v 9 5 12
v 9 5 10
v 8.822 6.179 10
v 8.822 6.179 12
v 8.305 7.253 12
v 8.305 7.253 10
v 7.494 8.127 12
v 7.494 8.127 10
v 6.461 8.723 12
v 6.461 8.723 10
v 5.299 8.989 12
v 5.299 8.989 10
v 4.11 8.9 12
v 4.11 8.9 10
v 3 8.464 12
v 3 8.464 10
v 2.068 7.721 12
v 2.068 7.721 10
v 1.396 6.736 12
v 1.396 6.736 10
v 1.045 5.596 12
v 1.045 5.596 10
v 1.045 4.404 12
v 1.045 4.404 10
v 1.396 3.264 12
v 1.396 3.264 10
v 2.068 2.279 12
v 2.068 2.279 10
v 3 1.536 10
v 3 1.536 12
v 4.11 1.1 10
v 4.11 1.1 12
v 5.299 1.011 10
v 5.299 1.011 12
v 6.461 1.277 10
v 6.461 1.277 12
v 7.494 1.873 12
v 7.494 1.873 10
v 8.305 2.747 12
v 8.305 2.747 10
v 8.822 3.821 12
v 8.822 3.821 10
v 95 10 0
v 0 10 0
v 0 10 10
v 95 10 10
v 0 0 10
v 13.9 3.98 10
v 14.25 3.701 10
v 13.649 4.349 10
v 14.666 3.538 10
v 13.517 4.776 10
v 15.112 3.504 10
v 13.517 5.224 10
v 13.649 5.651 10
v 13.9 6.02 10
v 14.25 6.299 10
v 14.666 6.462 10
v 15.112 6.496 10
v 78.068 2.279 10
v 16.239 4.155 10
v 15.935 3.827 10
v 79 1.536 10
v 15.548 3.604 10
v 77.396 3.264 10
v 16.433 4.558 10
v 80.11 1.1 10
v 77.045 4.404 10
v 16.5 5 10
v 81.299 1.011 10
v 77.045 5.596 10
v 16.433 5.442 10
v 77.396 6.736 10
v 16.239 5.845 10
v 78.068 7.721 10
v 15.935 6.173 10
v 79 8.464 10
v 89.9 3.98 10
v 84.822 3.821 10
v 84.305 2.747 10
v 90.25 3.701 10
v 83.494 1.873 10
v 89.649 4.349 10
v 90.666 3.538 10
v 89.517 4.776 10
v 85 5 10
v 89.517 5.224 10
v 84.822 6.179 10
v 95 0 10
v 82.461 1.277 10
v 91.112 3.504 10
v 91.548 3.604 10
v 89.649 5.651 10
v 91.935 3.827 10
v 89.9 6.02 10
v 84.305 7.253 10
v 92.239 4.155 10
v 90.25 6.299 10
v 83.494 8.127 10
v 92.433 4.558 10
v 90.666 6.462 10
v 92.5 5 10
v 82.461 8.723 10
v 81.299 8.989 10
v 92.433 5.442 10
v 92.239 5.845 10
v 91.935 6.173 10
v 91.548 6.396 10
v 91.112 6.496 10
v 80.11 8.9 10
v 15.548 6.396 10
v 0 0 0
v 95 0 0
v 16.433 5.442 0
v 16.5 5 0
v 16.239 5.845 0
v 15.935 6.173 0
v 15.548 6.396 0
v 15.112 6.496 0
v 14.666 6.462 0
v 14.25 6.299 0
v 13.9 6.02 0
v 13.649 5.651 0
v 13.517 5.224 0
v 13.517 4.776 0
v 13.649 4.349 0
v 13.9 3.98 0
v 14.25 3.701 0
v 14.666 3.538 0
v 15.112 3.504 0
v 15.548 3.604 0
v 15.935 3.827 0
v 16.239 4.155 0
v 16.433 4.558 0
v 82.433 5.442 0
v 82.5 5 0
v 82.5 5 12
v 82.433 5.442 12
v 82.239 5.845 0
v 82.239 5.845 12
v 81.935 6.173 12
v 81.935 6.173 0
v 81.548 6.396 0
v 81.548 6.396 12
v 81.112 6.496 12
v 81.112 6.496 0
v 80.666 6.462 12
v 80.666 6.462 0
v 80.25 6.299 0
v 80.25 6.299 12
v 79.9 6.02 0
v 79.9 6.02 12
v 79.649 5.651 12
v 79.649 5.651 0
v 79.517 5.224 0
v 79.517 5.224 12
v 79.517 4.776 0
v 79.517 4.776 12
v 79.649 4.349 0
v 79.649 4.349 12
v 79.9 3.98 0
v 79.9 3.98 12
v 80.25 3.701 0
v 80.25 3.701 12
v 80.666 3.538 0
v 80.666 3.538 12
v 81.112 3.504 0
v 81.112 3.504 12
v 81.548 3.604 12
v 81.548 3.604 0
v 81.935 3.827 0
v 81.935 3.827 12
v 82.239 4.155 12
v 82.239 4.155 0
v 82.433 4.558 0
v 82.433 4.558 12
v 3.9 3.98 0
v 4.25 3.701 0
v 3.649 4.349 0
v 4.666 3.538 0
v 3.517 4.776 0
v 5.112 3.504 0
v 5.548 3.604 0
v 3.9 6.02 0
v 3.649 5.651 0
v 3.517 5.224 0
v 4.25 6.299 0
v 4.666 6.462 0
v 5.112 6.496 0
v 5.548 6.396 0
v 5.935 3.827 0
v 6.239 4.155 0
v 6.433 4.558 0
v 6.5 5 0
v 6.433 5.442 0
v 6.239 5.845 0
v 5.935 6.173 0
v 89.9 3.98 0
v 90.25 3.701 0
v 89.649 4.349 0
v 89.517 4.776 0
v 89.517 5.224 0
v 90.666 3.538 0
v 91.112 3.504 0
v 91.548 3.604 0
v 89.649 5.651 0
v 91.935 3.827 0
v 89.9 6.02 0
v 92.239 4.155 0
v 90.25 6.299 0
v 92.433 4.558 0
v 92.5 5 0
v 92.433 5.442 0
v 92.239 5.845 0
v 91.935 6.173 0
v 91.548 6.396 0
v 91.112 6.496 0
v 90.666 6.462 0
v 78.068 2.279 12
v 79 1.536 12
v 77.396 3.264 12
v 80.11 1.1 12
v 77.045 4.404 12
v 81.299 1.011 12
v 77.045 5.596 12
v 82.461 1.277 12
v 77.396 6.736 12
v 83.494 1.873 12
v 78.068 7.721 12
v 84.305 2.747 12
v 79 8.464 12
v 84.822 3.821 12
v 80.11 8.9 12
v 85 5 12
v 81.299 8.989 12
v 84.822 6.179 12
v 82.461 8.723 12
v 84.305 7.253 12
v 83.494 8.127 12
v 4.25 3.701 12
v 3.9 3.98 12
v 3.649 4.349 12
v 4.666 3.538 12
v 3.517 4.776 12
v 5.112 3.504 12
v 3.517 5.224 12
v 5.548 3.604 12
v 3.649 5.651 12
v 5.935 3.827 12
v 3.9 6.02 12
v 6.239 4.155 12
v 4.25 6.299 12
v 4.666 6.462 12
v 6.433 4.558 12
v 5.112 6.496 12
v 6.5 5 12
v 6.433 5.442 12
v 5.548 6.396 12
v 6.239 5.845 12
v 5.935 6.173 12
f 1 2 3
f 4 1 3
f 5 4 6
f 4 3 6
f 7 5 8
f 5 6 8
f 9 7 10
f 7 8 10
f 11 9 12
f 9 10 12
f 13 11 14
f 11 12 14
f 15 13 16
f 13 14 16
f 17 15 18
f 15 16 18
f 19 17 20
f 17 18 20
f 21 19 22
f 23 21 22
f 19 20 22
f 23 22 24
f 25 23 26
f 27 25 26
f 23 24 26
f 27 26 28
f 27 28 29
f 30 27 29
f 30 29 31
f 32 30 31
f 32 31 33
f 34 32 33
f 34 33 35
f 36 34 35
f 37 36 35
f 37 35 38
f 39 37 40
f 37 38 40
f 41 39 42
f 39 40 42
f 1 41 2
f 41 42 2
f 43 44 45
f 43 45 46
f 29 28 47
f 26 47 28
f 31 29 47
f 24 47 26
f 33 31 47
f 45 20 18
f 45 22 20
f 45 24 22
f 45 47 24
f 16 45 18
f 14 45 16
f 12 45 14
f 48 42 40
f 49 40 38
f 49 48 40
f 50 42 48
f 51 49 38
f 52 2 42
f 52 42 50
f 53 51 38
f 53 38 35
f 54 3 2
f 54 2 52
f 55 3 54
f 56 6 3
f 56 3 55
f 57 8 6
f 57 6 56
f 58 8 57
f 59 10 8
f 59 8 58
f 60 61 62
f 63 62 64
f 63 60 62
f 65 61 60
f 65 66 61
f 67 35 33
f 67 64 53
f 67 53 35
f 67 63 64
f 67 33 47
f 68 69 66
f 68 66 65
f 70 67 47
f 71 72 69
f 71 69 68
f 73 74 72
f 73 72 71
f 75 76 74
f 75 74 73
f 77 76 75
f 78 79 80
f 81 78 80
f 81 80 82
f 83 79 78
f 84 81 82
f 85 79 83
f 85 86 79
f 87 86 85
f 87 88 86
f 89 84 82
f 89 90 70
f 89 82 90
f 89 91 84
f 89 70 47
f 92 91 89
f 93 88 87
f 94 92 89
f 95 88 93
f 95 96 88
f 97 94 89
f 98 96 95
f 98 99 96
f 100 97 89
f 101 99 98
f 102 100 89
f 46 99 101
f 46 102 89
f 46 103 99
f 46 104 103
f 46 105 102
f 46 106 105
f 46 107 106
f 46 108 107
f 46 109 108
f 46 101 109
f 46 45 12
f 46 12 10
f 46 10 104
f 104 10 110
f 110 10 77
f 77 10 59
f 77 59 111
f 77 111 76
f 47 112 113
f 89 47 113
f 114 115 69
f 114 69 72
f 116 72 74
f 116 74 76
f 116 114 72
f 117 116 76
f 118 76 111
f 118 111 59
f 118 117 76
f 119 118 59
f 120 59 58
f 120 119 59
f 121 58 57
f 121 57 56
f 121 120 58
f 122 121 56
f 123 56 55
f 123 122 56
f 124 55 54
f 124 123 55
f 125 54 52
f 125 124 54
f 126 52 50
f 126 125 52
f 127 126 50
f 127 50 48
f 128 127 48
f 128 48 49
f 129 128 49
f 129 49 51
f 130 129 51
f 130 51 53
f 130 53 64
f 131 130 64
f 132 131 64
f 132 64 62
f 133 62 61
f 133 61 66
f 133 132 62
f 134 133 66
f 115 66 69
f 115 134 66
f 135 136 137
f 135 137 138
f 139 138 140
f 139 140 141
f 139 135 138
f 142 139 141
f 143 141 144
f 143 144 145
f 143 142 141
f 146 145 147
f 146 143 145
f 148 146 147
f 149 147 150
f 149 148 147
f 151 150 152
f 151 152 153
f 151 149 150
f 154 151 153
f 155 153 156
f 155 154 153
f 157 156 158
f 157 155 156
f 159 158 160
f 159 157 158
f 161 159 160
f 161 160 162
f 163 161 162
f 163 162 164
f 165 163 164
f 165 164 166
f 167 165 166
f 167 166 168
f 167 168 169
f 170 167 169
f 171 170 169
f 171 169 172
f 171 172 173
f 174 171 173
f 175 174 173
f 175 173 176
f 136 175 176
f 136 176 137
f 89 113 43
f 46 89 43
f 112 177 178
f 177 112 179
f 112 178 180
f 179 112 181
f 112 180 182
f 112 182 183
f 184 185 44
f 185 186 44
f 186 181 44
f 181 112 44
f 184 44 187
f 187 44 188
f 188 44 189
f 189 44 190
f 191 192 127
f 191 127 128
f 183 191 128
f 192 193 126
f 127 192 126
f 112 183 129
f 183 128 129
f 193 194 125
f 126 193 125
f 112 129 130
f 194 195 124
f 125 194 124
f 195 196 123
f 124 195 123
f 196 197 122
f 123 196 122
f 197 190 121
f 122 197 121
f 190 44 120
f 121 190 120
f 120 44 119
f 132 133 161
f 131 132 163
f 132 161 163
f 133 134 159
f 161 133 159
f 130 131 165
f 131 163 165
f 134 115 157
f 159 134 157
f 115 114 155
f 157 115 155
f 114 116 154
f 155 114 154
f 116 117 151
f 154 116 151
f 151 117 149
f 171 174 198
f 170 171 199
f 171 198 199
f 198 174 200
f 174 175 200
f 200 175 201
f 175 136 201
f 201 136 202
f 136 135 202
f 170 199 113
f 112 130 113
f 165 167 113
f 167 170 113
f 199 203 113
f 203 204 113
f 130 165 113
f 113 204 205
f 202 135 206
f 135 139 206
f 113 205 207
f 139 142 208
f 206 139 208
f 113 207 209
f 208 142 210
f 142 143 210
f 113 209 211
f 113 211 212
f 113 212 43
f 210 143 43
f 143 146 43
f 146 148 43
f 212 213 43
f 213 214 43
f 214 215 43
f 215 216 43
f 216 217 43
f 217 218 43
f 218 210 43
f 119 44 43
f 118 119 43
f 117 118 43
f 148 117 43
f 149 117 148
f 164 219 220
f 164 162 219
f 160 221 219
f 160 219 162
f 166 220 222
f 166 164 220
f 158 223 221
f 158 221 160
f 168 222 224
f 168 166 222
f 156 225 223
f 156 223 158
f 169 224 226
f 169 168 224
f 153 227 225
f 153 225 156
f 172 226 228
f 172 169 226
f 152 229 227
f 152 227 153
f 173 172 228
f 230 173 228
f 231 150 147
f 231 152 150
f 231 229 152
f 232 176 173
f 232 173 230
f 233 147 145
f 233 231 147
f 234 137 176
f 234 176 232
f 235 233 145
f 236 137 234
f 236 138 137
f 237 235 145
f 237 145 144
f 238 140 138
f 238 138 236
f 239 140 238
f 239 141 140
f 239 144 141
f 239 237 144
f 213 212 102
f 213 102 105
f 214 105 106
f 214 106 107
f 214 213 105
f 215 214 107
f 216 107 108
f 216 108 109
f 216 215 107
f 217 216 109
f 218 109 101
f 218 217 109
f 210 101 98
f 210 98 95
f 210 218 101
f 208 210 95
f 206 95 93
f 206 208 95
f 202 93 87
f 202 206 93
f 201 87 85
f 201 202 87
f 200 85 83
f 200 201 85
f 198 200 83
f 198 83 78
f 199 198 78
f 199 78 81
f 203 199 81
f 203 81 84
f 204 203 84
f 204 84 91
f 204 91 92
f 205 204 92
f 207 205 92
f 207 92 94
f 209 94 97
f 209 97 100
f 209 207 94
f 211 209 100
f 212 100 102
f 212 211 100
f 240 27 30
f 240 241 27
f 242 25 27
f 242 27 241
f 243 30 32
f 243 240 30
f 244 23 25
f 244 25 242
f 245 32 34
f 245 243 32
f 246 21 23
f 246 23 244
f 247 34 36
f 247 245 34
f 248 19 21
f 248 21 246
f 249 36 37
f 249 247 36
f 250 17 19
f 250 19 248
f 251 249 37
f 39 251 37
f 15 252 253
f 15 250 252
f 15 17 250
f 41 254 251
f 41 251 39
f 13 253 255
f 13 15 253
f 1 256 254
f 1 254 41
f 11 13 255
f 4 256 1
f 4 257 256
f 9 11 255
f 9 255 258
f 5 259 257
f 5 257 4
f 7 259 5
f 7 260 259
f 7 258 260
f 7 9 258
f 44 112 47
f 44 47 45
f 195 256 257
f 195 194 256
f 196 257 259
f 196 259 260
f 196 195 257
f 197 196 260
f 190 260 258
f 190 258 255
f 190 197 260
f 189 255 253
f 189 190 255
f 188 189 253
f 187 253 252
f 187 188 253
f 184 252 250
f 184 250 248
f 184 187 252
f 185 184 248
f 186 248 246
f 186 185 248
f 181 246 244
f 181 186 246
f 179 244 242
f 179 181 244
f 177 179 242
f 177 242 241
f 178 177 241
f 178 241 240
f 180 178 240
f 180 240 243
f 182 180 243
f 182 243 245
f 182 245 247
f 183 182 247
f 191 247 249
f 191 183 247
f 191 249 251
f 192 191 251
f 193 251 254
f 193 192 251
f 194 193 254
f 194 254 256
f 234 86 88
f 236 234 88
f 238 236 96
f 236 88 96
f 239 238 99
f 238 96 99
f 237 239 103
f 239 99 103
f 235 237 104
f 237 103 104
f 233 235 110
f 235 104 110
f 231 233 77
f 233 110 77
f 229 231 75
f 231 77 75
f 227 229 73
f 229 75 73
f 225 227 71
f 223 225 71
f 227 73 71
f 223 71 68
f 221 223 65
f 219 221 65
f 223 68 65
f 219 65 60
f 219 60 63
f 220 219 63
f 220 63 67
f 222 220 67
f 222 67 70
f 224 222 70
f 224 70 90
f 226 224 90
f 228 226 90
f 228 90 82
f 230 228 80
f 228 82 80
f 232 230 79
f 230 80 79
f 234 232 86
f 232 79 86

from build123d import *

# Parameters (mm, degrees)
SKETCH_W      = 95
SKETCH_H      = 10
SKETCH_R      = 1.5
PAD_DEPTH     = 10
SKETCH001_R   = 4
SKETCH001_R_2 = 1.5
PAD001_DEPTH  = 2


with BuildPart() as part:
    # Sketch → Pad (new body)
    with BuildSketch(Plane.XY):
        with Locations((47.5, 5)):
            Rectangle(SKETCH_W, SKETCH_H)
        with Locations((5, 5)):
            Circle(SKETCH_R, mode=Mode.SUBTRACT)
        with Locations((81, 5)):
            Circle(SKETCH_R, mode=Mode.SUBTRACT)
        with Locations((91, 5)):
            Circle(SKETCH_R, mode=Mode.SUBTRACT)
        with Locations((15, 5)):
            Circle(SKETCH_R, mode=Mode.SUBTRACT)
    extrude(amount=PAD_DEPTH)

    # Sketch001 (on Face10 of Pad) → Pad001 (join)
    with BuildSketch(Plane.XY.offset(10)):
        with Locations((5, 5)):
            Circle(SKETCH001_R)
        with Locations((5, 5)):
            Circle(SKETCH001_R_2, mode=Mode.SUBTRACT)
        with Locations((81, 5)):
            Circle(SKETCH001_R)
        with Locations((81, 5)):
            Circle(SKETCH001_R_2, mode=Mode.SUBTRACT)
    extrude(amount=PAD001_DEPTH)


solid = part.part
